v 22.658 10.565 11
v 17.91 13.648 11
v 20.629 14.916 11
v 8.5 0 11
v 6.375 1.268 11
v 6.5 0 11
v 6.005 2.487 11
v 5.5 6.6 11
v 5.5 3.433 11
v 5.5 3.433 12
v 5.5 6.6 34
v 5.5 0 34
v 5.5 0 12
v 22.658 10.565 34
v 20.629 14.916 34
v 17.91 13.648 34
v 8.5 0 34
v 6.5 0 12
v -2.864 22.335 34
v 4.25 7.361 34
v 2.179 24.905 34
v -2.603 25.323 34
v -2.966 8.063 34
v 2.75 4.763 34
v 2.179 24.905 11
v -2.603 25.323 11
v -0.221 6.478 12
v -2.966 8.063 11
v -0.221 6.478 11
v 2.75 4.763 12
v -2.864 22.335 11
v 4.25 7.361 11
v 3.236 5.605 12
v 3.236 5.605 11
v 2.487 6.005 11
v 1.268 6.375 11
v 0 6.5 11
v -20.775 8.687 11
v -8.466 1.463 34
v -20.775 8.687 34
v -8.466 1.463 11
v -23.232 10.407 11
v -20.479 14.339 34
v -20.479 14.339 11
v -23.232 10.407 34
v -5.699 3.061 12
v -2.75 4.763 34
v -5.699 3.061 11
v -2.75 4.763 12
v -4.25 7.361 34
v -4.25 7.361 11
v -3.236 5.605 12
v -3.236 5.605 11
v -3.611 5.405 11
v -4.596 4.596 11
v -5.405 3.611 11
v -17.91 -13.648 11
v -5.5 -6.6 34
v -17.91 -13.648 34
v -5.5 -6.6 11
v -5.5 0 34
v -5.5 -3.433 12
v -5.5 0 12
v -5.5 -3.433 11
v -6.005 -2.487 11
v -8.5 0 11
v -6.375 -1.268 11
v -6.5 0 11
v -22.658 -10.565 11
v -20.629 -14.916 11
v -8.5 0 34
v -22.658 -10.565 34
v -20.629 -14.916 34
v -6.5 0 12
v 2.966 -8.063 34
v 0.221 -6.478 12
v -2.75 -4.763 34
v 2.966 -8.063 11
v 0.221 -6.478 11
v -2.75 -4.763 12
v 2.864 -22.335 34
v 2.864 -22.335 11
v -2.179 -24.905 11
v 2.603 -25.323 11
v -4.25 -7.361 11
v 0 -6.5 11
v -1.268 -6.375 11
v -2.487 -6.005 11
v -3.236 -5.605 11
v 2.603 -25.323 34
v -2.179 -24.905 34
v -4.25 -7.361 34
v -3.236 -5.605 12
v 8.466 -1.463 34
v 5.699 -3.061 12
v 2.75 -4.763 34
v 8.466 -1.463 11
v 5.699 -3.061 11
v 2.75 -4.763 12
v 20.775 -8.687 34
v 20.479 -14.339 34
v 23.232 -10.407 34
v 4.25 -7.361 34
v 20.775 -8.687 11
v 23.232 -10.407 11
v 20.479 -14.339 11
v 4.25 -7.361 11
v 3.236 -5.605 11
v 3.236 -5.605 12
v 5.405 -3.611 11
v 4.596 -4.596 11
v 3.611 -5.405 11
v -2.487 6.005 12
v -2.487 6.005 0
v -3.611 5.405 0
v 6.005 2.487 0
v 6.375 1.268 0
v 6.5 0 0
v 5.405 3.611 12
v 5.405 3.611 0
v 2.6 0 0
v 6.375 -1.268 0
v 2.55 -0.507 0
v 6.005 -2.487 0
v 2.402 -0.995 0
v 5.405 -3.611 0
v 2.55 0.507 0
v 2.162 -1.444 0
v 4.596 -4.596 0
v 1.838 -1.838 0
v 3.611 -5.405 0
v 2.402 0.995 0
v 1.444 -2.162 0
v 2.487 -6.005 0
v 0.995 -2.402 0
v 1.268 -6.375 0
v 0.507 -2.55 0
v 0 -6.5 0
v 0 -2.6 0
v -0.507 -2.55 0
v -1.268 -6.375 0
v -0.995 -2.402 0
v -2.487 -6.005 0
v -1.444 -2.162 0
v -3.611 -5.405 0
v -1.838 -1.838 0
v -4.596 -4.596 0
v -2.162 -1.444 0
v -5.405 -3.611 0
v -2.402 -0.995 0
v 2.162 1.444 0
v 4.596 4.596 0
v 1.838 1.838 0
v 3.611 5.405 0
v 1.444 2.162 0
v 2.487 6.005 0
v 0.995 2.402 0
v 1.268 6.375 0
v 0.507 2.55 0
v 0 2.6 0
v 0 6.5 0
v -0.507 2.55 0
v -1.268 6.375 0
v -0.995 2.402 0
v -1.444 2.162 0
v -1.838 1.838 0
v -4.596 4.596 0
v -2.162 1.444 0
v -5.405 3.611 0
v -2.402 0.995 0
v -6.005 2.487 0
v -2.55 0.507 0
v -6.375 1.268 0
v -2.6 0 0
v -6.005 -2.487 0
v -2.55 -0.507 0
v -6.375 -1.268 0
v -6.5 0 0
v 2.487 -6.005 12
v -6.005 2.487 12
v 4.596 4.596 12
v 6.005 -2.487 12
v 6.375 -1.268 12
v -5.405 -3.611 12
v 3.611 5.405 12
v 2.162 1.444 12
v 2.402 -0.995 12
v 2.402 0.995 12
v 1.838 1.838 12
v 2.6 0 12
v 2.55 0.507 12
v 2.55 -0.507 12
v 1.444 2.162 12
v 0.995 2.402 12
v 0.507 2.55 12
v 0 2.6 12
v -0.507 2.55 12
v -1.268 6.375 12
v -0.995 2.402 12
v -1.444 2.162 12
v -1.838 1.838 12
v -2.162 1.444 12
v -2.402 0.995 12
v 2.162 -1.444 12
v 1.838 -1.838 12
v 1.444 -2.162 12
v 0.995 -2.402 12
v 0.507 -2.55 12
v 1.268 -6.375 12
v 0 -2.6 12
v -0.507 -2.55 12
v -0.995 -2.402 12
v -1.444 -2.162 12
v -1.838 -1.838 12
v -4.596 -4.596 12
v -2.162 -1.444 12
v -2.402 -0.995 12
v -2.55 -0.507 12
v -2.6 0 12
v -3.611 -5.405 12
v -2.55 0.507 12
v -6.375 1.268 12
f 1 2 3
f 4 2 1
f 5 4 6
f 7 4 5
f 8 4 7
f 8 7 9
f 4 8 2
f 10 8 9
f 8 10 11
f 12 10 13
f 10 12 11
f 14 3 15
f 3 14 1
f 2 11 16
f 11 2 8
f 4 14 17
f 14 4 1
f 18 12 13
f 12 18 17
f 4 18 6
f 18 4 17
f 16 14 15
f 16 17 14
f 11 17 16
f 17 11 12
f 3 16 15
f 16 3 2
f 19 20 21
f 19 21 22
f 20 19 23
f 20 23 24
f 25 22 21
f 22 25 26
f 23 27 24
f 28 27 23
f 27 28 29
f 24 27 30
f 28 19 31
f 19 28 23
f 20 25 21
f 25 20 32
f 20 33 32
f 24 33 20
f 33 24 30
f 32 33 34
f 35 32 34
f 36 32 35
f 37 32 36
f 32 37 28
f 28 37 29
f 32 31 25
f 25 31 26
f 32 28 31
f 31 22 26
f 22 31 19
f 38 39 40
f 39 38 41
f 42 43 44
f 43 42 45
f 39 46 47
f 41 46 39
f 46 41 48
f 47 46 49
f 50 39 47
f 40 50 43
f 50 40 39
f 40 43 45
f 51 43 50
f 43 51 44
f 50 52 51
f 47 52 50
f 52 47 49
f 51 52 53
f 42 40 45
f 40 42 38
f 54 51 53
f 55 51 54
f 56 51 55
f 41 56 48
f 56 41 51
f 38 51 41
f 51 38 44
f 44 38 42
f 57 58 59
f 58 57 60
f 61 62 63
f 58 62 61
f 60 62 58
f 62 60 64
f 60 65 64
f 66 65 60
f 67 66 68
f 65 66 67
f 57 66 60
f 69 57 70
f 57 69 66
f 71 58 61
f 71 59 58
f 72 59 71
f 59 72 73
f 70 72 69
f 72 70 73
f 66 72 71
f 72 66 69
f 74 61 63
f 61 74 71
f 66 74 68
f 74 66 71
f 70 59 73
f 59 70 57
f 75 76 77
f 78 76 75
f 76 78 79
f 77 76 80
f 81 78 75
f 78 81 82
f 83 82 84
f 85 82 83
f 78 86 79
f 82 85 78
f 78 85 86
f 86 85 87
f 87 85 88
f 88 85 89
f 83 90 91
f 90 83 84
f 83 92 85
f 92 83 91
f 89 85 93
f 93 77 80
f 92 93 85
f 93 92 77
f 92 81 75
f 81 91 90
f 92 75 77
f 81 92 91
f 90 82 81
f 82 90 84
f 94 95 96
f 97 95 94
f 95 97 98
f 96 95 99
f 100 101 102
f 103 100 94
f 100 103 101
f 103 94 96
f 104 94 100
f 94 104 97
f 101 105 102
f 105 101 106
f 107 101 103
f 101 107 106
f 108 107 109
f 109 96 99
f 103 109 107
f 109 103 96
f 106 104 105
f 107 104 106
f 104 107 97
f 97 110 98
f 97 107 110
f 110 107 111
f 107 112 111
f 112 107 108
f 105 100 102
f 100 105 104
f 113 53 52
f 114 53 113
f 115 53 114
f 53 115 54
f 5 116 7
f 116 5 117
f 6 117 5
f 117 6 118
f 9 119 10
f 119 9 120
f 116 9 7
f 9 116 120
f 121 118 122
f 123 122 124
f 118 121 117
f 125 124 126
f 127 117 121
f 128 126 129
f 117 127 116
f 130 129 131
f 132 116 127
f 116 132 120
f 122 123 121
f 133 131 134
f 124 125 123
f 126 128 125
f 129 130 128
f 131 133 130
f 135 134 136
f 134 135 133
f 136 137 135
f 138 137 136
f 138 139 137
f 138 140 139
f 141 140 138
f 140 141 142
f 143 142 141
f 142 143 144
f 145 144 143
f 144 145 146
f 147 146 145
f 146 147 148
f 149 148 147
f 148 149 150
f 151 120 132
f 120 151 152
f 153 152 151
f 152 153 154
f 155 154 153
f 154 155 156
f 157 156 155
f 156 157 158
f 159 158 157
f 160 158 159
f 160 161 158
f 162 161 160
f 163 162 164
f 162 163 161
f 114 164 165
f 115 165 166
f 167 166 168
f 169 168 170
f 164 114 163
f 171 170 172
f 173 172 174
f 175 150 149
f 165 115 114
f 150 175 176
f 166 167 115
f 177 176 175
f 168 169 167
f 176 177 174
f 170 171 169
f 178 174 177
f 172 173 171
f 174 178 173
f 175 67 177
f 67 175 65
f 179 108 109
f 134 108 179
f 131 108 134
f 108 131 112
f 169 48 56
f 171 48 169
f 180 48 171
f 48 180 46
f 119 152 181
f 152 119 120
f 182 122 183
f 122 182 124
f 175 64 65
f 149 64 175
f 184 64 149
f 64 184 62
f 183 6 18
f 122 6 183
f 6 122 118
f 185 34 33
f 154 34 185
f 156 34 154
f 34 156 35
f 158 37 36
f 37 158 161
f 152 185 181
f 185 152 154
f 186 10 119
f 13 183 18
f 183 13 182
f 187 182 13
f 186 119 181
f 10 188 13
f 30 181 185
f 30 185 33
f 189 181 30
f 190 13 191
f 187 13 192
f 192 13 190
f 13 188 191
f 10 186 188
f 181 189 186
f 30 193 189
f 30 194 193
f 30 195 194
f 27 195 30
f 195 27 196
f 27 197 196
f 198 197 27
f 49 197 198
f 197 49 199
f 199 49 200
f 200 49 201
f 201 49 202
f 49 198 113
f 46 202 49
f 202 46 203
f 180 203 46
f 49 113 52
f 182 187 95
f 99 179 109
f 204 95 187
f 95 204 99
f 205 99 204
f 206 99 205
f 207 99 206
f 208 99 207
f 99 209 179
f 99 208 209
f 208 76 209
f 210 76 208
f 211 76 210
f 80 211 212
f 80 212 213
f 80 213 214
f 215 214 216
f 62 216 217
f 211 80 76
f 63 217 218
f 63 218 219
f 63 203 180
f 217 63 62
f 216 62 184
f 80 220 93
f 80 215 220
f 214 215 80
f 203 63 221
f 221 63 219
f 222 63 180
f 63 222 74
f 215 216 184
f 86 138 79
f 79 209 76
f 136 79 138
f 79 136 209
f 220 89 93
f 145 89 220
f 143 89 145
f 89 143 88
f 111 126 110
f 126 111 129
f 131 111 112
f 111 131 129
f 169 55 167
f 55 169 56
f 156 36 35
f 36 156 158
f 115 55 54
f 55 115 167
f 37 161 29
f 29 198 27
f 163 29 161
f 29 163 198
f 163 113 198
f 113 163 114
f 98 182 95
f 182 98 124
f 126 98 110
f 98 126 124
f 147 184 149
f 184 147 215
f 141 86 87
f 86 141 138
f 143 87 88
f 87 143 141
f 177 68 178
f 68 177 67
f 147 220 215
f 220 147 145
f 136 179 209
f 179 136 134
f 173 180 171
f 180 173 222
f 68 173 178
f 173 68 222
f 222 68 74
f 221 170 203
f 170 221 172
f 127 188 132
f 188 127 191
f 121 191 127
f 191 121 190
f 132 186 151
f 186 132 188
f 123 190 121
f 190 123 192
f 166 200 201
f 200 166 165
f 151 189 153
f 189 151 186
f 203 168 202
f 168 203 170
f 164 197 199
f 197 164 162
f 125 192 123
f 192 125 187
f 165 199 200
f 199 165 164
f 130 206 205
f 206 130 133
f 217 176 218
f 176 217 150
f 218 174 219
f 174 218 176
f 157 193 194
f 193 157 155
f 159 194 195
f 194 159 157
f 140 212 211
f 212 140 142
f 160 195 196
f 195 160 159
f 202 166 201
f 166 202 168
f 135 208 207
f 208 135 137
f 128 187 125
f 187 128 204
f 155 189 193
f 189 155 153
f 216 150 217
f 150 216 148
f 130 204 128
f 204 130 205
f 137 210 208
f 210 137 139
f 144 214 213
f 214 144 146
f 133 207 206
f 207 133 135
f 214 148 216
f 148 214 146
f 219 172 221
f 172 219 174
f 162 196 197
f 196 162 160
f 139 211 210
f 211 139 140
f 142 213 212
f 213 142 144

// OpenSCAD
$fn = 32;

// ----------------------------------------------------------------------
// Impeller: 50 mm, 6 blades, 34 mm tall
// ----------------------------------------------------------------------

// --- parameters (mm) ---
boss_d = 13;              // hub diameter
boss_h = 12;              // hub height
rotor_d = 50;             // outer diameter over the blades
vane_count = 6;           // number of blades
blade_t = 3;              // blade thickness
blade_h = 22;             // blade height
blade_in_r = 5.5;         // blade root radius
blade_out_r = 22;         // blade tip radius
sweep = 25;               // blade sweep, degrees
bore_d = 5.2;             // shaft bore

module hub() {
  cylinder(h = boss_h, d = boss_d);
}

module blade() {
  /* blade swept between two boxes: hull of the root and the tip section */
  hull() {
    translate([blade_in_r, 0, boss_h - 1])
      cube([blade_t, blade_t * 2.2, blade_h + 1], center = false);
    rotate([0, 0, sweep])
      translate([blade_out_r, 0, boss_h - 1])
        cube([blade_t, blade_t * 1.6, blade_h + 1], center = false);
  }
}

module blades() {
  for (i = [0 : vane_count - 1])
    rotate([0, 0, i * 360 / vane_count]) blade();
}

difference() {
  union() {
    hub();
    blades();
  }
  translate([0, 0, -1]) cylinder(h = boss_h + blade_h + 0 + 3, d = bore_d);
}
